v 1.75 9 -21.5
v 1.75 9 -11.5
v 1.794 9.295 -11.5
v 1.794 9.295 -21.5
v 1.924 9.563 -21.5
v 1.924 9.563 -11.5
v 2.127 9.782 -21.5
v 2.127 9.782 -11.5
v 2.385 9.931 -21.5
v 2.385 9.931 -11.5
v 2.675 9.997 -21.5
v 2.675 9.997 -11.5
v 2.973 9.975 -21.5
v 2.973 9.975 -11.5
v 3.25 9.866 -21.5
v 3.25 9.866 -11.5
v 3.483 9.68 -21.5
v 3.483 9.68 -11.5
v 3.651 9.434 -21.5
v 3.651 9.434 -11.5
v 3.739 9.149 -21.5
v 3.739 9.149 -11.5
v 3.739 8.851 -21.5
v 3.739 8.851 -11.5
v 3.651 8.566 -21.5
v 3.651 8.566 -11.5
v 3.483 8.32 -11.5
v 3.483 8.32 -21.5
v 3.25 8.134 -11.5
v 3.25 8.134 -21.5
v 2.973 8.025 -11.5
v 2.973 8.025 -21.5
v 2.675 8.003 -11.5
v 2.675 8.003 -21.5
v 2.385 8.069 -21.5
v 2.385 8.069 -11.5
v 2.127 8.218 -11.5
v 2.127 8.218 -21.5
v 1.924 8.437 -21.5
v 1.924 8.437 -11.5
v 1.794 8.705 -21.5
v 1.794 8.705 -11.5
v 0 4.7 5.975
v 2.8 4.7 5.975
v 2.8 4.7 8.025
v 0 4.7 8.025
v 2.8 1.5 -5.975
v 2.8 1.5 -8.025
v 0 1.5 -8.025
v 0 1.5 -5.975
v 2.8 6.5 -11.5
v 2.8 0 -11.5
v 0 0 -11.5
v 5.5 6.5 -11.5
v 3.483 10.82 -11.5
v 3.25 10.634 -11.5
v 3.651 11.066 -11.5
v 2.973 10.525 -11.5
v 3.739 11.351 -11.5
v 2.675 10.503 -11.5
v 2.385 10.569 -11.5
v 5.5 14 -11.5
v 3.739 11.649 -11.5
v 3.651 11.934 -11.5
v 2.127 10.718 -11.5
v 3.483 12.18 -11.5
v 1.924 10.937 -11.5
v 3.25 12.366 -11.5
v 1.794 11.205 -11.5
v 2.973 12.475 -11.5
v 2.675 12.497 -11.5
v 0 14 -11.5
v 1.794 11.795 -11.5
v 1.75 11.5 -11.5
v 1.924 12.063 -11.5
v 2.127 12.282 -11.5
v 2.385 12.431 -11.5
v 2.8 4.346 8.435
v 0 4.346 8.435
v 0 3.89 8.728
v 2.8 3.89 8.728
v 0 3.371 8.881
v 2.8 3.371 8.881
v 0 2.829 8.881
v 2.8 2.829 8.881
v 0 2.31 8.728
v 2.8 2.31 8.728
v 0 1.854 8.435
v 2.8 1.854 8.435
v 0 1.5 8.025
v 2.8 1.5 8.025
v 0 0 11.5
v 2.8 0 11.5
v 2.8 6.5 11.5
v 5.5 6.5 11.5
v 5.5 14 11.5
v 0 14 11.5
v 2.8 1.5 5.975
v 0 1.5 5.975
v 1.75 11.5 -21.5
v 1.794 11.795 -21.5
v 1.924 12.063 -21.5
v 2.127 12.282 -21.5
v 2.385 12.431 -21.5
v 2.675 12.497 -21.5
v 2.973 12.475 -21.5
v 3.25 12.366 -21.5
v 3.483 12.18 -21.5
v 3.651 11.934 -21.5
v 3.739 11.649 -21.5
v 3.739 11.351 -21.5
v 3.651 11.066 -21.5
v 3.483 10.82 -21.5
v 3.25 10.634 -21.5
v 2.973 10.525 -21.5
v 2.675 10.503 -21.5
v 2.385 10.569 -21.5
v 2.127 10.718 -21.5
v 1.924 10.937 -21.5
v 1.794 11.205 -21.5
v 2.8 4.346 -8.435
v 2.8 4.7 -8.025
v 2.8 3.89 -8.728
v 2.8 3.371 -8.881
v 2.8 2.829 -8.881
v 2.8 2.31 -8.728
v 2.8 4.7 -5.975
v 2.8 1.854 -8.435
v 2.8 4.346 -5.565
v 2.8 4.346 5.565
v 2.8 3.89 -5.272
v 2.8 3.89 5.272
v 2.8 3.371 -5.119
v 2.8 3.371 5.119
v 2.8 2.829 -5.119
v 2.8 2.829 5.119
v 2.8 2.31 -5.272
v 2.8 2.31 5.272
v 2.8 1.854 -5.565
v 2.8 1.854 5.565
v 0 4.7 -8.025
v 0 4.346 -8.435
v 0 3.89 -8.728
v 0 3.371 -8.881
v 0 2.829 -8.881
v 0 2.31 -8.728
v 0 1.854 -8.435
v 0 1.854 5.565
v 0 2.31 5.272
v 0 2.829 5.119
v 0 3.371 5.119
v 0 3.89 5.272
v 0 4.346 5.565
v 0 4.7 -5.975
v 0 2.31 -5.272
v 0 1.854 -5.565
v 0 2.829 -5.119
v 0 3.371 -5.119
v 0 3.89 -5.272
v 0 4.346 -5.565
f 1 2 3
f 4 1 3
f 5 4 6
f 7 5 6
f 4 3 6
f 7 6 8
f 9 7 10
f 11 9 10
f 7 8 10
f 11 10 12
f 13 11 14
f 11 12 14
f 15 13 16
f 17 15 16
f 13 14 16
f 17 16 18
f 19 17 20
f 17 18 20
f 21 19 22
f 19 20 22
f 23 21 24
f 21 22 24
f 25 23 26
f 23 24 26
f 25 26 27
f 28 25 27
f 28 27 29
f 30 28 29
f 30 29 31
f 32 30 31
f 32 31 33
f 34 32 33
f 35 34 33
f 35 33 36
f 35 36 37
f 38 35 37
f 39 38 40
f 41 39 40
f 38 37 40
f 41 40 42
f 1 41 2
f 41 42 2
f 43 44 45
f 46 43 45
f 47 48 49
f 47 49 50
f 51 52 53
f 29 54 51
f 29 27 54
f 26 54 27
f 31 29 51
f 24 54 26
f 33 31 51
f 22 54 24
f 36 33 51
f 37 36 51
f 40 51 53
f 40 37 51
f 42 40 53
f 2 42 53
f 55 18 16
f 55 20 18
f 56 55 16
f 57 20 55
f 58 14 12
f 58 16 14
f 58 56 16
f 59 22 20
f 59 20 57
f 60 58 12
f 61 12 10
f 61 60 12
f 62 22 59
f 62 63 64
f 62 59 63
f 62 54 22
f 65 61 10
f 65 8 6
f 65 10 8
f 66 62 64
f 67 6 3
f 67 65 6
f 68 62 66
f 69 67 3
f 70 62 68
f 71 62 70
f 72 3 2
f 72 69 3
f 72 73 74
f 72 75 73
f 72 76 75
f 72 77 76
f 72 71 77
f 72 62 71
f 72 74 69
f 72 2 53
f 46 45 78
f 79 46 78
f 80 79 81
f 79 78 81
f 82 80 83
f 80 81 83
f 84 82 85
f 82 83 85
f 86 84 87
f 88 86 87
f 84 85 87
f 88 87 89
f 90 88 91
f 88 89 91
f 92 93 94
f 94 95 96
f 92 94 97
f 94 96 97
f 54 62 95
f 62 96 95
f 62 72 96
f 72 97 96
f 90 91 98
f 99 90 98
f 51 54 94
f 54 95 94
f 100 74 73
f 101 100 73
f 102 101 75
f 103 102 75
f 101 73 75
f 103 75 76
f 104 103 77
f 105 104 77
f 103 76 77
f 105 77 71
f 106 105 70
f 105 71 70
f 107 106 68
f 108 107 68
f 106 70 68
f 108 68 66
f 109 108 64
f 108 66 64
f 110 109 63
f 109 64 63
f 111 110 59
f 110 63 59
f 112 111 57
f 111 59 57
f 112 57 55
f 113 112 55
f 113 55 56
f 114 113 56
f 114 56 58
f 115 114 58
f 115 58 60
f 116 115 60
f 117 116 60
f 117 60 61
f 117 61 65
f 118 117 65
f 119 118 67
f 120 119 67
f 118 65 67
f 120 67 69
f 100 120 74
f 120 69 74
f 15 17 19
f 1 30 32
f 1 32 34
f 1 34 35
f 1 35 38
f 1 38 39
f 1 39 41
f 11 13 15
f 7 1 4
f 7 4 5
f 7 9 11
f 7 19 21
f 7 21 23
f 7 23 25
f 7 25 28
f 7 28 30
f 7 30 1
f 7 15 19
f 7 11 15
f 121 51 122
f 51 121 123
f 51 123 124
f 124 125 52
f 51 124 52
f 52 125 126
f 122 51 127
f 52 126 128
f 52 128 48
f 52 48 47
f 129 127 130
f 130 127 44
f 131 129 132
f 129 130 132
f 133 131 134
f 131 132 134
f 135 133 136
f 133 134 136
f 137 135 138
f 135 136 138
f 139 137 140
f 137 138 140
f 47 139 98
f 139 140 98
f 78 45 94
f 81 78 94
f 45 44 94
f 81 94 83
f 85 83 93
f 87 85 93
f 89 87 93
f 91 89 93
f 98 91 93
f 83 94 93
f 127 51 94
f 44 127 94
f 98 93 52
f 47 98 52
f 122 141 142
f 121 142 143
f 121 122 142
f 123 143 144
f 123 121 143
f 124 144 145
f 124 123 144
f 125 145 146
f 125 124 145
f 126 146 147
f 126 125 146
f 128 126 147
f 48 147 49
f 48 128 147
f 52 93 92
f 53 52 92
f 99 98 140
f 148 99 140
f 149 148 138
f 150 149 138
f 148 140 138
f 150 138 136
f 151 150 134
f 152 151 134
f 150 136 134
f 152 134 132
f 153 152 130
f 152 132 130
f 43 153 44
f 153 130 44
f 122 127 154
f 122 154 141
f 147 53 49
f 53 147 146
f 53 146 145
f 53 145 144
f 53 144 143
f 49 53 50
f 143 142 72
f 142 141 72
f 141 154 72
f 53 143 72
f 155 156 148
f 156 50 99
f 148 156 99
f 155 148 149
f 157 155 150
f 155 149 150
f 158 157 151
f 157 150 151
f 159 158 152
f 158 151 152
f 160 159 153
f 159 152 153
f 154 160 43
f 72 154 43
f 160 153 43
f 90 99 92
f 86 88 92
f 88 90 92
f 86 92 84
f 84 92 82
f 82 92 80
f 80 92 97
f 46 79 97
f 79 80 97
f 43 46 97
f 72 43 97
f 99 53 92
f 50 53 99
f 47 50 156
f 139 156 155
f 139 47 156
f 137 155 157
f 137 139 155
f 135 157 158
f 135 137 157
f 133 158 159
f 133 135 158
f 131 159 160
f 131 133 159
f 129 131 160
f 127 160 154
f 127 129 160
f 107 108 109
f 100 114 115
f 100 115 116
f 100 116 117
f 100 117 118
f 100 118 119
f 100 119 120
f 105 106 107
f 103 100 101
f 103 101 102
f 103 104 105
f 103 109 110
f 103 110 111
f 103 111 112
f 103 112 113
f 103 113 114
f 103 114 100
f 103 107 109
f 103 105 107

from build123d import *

# Parameters (mm, degrees)
DODANIE_WYCI_GNI_CIE1_DEPTH = 11.5
SZKIC2_R                    = 1
DODANIE_WYCI_GNI_CIE2_DEPTH = 10
WYTNIJ_WYCI_GNI_CIE1_DEPTH  = 10


with BuildPart() as part:
    # Szkic1 → Dodanie-wyciągnięcie1 (new body, symmetric)
    with BuildSketch(Plane.XY):
        Polygon((0, 0), (0, 14), (5.5, 14), (5.5, 6.5), (2.8, 6.5), (2.8, 0), align=None)
    extrude(amount=DODANIE_WYCI_GNI_CIE1_DEPTH, both=True)

    # Szkic2 → Dodanie-wyciągnięcie2 (add)
    with BuildSketch(Plane(origin=(0, 0, -11.5), x_dir=(-1, 0, 0), z_dir=(0, 0, -1))):
        with Locations((-2.75, 11.5)):
            Circle(SZKIC2_R)
        with Locations((-2.75, 9)):
            Circle(SZKIC2_R)
    extrude(amount=DODANIE_WYCI_GNI_CIE2_DEPTH)

    # Szkic3 → Wytnij-wyciągnięcie1 (cut)
    with BuildSketch(Plane(origin=(2.8, 0, 0), x_dir=(0, 0, -1), z_dir=(1, 0, 0))):
        with BuildLine():
            Line((-8.024695077, 1.5), (-5.975304923, 1.5))
            ThreePointArc((-5.975304923, 1.5), (-5.1, 3.1), (-5.975304923, 4.7))
            Line((-5.975304923, 4.7), (-8.024695077, 4.7))
            ThreePointArc((-8.024695077, 4.7), (-8.9, 3.1), (-8.024695077, 1.5))
        make_face()
        with BuildLine():
            Line((8.024695077, 1.5), (5.975304923, 1.5))
            ThreePointArc((5.975304923, 1.5), (5.1, 3.1), (5.975304923, 4.7))
            Line((5.975304923, 4.7), (8.024695077, 4.7))
            ThreePointArc((8.024695077, 4.7), (8.9, 3.1), (8.024695077, 1.5))
        make_face()
    extrude(amount=-WYTNIJ_WYCI_GNI_CIE1_DEPTH, mode=Mode.SUBTRACT)


solid = part.part
